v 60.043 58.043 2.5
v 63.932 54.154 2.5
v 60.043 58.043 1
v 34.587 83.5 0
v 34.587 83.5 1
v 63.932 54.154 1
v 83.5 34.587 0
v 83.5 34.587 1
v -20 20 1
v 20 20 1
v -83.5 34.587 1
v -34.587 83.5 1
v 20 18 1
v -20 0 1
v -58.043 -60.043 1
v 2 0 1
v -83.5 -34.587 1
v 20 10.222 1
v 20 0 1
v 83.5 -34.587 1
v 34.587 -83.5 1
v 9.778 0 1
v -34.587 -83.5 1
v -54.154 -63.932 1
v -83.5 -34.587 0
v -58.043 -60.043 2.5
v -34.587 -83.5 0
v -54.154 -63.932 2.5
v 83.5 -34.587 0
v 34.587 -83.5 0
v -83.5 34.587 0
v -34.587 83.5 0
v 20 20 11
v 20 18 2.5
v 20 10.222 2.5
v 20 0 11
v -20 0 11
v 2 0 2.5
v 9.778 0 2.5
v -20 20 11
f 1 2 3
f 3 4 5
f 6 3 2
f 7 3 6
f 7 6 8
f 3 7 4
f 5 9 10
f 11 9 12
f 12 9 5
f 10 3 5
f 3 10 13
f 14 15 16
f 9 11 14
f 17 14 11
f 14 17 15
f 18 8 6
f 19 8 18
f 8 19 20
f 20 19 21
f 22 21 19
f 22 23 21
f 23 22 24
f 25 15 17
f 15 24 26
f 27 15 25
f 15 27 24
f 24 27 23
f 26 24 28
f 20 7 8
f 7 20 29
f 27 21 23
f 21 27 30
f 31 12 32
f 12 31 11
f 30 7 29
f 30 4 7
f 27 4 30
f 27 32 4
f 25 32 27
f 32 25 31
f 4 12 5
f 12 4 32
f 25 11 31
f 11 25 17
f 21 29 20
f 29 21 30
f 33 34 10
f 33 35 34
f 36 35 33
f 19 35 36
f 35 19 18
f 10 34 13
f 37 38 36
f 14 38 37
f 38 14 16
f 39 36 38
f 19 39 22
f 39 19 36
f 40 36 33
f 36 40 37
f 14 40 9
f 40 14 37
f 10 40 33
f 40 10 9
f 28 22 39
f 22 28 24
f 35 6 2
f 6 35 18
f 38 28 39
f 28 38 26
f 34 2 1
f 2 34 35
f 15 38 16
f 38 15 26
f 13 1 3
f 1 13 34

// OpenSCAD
// Generated by DescriptiveCAD bootstrap v0.2
  // boundary visualization
  linear_extrude(height=1.0) polygon(points=[[-34.586832, 83.500000], [34.586832, 83.500000], [83.500000, 34.586832], [83.500000, -34.586832], [34.586832, -83.500000], [-34.586832, -83.500000], [-83.500000, -34.586832], [-83.500000, 34.586832]]);
  translate([0,0,1.0]) linear_extrude(height=10) polygon(points=[[-20.000000, 20.000000], [20.000000, 20.000000], [20.000000, 0.000000], [-20.000000, 0.000000]]);
  translate([0,0,1.0]) linear_extrude(height=1.5) polygon(points=[[-58.043416, -60.043416], [-54.154329, -63.932504], [63.932504, 54.154329], [60.043416, 58.043416]]);
